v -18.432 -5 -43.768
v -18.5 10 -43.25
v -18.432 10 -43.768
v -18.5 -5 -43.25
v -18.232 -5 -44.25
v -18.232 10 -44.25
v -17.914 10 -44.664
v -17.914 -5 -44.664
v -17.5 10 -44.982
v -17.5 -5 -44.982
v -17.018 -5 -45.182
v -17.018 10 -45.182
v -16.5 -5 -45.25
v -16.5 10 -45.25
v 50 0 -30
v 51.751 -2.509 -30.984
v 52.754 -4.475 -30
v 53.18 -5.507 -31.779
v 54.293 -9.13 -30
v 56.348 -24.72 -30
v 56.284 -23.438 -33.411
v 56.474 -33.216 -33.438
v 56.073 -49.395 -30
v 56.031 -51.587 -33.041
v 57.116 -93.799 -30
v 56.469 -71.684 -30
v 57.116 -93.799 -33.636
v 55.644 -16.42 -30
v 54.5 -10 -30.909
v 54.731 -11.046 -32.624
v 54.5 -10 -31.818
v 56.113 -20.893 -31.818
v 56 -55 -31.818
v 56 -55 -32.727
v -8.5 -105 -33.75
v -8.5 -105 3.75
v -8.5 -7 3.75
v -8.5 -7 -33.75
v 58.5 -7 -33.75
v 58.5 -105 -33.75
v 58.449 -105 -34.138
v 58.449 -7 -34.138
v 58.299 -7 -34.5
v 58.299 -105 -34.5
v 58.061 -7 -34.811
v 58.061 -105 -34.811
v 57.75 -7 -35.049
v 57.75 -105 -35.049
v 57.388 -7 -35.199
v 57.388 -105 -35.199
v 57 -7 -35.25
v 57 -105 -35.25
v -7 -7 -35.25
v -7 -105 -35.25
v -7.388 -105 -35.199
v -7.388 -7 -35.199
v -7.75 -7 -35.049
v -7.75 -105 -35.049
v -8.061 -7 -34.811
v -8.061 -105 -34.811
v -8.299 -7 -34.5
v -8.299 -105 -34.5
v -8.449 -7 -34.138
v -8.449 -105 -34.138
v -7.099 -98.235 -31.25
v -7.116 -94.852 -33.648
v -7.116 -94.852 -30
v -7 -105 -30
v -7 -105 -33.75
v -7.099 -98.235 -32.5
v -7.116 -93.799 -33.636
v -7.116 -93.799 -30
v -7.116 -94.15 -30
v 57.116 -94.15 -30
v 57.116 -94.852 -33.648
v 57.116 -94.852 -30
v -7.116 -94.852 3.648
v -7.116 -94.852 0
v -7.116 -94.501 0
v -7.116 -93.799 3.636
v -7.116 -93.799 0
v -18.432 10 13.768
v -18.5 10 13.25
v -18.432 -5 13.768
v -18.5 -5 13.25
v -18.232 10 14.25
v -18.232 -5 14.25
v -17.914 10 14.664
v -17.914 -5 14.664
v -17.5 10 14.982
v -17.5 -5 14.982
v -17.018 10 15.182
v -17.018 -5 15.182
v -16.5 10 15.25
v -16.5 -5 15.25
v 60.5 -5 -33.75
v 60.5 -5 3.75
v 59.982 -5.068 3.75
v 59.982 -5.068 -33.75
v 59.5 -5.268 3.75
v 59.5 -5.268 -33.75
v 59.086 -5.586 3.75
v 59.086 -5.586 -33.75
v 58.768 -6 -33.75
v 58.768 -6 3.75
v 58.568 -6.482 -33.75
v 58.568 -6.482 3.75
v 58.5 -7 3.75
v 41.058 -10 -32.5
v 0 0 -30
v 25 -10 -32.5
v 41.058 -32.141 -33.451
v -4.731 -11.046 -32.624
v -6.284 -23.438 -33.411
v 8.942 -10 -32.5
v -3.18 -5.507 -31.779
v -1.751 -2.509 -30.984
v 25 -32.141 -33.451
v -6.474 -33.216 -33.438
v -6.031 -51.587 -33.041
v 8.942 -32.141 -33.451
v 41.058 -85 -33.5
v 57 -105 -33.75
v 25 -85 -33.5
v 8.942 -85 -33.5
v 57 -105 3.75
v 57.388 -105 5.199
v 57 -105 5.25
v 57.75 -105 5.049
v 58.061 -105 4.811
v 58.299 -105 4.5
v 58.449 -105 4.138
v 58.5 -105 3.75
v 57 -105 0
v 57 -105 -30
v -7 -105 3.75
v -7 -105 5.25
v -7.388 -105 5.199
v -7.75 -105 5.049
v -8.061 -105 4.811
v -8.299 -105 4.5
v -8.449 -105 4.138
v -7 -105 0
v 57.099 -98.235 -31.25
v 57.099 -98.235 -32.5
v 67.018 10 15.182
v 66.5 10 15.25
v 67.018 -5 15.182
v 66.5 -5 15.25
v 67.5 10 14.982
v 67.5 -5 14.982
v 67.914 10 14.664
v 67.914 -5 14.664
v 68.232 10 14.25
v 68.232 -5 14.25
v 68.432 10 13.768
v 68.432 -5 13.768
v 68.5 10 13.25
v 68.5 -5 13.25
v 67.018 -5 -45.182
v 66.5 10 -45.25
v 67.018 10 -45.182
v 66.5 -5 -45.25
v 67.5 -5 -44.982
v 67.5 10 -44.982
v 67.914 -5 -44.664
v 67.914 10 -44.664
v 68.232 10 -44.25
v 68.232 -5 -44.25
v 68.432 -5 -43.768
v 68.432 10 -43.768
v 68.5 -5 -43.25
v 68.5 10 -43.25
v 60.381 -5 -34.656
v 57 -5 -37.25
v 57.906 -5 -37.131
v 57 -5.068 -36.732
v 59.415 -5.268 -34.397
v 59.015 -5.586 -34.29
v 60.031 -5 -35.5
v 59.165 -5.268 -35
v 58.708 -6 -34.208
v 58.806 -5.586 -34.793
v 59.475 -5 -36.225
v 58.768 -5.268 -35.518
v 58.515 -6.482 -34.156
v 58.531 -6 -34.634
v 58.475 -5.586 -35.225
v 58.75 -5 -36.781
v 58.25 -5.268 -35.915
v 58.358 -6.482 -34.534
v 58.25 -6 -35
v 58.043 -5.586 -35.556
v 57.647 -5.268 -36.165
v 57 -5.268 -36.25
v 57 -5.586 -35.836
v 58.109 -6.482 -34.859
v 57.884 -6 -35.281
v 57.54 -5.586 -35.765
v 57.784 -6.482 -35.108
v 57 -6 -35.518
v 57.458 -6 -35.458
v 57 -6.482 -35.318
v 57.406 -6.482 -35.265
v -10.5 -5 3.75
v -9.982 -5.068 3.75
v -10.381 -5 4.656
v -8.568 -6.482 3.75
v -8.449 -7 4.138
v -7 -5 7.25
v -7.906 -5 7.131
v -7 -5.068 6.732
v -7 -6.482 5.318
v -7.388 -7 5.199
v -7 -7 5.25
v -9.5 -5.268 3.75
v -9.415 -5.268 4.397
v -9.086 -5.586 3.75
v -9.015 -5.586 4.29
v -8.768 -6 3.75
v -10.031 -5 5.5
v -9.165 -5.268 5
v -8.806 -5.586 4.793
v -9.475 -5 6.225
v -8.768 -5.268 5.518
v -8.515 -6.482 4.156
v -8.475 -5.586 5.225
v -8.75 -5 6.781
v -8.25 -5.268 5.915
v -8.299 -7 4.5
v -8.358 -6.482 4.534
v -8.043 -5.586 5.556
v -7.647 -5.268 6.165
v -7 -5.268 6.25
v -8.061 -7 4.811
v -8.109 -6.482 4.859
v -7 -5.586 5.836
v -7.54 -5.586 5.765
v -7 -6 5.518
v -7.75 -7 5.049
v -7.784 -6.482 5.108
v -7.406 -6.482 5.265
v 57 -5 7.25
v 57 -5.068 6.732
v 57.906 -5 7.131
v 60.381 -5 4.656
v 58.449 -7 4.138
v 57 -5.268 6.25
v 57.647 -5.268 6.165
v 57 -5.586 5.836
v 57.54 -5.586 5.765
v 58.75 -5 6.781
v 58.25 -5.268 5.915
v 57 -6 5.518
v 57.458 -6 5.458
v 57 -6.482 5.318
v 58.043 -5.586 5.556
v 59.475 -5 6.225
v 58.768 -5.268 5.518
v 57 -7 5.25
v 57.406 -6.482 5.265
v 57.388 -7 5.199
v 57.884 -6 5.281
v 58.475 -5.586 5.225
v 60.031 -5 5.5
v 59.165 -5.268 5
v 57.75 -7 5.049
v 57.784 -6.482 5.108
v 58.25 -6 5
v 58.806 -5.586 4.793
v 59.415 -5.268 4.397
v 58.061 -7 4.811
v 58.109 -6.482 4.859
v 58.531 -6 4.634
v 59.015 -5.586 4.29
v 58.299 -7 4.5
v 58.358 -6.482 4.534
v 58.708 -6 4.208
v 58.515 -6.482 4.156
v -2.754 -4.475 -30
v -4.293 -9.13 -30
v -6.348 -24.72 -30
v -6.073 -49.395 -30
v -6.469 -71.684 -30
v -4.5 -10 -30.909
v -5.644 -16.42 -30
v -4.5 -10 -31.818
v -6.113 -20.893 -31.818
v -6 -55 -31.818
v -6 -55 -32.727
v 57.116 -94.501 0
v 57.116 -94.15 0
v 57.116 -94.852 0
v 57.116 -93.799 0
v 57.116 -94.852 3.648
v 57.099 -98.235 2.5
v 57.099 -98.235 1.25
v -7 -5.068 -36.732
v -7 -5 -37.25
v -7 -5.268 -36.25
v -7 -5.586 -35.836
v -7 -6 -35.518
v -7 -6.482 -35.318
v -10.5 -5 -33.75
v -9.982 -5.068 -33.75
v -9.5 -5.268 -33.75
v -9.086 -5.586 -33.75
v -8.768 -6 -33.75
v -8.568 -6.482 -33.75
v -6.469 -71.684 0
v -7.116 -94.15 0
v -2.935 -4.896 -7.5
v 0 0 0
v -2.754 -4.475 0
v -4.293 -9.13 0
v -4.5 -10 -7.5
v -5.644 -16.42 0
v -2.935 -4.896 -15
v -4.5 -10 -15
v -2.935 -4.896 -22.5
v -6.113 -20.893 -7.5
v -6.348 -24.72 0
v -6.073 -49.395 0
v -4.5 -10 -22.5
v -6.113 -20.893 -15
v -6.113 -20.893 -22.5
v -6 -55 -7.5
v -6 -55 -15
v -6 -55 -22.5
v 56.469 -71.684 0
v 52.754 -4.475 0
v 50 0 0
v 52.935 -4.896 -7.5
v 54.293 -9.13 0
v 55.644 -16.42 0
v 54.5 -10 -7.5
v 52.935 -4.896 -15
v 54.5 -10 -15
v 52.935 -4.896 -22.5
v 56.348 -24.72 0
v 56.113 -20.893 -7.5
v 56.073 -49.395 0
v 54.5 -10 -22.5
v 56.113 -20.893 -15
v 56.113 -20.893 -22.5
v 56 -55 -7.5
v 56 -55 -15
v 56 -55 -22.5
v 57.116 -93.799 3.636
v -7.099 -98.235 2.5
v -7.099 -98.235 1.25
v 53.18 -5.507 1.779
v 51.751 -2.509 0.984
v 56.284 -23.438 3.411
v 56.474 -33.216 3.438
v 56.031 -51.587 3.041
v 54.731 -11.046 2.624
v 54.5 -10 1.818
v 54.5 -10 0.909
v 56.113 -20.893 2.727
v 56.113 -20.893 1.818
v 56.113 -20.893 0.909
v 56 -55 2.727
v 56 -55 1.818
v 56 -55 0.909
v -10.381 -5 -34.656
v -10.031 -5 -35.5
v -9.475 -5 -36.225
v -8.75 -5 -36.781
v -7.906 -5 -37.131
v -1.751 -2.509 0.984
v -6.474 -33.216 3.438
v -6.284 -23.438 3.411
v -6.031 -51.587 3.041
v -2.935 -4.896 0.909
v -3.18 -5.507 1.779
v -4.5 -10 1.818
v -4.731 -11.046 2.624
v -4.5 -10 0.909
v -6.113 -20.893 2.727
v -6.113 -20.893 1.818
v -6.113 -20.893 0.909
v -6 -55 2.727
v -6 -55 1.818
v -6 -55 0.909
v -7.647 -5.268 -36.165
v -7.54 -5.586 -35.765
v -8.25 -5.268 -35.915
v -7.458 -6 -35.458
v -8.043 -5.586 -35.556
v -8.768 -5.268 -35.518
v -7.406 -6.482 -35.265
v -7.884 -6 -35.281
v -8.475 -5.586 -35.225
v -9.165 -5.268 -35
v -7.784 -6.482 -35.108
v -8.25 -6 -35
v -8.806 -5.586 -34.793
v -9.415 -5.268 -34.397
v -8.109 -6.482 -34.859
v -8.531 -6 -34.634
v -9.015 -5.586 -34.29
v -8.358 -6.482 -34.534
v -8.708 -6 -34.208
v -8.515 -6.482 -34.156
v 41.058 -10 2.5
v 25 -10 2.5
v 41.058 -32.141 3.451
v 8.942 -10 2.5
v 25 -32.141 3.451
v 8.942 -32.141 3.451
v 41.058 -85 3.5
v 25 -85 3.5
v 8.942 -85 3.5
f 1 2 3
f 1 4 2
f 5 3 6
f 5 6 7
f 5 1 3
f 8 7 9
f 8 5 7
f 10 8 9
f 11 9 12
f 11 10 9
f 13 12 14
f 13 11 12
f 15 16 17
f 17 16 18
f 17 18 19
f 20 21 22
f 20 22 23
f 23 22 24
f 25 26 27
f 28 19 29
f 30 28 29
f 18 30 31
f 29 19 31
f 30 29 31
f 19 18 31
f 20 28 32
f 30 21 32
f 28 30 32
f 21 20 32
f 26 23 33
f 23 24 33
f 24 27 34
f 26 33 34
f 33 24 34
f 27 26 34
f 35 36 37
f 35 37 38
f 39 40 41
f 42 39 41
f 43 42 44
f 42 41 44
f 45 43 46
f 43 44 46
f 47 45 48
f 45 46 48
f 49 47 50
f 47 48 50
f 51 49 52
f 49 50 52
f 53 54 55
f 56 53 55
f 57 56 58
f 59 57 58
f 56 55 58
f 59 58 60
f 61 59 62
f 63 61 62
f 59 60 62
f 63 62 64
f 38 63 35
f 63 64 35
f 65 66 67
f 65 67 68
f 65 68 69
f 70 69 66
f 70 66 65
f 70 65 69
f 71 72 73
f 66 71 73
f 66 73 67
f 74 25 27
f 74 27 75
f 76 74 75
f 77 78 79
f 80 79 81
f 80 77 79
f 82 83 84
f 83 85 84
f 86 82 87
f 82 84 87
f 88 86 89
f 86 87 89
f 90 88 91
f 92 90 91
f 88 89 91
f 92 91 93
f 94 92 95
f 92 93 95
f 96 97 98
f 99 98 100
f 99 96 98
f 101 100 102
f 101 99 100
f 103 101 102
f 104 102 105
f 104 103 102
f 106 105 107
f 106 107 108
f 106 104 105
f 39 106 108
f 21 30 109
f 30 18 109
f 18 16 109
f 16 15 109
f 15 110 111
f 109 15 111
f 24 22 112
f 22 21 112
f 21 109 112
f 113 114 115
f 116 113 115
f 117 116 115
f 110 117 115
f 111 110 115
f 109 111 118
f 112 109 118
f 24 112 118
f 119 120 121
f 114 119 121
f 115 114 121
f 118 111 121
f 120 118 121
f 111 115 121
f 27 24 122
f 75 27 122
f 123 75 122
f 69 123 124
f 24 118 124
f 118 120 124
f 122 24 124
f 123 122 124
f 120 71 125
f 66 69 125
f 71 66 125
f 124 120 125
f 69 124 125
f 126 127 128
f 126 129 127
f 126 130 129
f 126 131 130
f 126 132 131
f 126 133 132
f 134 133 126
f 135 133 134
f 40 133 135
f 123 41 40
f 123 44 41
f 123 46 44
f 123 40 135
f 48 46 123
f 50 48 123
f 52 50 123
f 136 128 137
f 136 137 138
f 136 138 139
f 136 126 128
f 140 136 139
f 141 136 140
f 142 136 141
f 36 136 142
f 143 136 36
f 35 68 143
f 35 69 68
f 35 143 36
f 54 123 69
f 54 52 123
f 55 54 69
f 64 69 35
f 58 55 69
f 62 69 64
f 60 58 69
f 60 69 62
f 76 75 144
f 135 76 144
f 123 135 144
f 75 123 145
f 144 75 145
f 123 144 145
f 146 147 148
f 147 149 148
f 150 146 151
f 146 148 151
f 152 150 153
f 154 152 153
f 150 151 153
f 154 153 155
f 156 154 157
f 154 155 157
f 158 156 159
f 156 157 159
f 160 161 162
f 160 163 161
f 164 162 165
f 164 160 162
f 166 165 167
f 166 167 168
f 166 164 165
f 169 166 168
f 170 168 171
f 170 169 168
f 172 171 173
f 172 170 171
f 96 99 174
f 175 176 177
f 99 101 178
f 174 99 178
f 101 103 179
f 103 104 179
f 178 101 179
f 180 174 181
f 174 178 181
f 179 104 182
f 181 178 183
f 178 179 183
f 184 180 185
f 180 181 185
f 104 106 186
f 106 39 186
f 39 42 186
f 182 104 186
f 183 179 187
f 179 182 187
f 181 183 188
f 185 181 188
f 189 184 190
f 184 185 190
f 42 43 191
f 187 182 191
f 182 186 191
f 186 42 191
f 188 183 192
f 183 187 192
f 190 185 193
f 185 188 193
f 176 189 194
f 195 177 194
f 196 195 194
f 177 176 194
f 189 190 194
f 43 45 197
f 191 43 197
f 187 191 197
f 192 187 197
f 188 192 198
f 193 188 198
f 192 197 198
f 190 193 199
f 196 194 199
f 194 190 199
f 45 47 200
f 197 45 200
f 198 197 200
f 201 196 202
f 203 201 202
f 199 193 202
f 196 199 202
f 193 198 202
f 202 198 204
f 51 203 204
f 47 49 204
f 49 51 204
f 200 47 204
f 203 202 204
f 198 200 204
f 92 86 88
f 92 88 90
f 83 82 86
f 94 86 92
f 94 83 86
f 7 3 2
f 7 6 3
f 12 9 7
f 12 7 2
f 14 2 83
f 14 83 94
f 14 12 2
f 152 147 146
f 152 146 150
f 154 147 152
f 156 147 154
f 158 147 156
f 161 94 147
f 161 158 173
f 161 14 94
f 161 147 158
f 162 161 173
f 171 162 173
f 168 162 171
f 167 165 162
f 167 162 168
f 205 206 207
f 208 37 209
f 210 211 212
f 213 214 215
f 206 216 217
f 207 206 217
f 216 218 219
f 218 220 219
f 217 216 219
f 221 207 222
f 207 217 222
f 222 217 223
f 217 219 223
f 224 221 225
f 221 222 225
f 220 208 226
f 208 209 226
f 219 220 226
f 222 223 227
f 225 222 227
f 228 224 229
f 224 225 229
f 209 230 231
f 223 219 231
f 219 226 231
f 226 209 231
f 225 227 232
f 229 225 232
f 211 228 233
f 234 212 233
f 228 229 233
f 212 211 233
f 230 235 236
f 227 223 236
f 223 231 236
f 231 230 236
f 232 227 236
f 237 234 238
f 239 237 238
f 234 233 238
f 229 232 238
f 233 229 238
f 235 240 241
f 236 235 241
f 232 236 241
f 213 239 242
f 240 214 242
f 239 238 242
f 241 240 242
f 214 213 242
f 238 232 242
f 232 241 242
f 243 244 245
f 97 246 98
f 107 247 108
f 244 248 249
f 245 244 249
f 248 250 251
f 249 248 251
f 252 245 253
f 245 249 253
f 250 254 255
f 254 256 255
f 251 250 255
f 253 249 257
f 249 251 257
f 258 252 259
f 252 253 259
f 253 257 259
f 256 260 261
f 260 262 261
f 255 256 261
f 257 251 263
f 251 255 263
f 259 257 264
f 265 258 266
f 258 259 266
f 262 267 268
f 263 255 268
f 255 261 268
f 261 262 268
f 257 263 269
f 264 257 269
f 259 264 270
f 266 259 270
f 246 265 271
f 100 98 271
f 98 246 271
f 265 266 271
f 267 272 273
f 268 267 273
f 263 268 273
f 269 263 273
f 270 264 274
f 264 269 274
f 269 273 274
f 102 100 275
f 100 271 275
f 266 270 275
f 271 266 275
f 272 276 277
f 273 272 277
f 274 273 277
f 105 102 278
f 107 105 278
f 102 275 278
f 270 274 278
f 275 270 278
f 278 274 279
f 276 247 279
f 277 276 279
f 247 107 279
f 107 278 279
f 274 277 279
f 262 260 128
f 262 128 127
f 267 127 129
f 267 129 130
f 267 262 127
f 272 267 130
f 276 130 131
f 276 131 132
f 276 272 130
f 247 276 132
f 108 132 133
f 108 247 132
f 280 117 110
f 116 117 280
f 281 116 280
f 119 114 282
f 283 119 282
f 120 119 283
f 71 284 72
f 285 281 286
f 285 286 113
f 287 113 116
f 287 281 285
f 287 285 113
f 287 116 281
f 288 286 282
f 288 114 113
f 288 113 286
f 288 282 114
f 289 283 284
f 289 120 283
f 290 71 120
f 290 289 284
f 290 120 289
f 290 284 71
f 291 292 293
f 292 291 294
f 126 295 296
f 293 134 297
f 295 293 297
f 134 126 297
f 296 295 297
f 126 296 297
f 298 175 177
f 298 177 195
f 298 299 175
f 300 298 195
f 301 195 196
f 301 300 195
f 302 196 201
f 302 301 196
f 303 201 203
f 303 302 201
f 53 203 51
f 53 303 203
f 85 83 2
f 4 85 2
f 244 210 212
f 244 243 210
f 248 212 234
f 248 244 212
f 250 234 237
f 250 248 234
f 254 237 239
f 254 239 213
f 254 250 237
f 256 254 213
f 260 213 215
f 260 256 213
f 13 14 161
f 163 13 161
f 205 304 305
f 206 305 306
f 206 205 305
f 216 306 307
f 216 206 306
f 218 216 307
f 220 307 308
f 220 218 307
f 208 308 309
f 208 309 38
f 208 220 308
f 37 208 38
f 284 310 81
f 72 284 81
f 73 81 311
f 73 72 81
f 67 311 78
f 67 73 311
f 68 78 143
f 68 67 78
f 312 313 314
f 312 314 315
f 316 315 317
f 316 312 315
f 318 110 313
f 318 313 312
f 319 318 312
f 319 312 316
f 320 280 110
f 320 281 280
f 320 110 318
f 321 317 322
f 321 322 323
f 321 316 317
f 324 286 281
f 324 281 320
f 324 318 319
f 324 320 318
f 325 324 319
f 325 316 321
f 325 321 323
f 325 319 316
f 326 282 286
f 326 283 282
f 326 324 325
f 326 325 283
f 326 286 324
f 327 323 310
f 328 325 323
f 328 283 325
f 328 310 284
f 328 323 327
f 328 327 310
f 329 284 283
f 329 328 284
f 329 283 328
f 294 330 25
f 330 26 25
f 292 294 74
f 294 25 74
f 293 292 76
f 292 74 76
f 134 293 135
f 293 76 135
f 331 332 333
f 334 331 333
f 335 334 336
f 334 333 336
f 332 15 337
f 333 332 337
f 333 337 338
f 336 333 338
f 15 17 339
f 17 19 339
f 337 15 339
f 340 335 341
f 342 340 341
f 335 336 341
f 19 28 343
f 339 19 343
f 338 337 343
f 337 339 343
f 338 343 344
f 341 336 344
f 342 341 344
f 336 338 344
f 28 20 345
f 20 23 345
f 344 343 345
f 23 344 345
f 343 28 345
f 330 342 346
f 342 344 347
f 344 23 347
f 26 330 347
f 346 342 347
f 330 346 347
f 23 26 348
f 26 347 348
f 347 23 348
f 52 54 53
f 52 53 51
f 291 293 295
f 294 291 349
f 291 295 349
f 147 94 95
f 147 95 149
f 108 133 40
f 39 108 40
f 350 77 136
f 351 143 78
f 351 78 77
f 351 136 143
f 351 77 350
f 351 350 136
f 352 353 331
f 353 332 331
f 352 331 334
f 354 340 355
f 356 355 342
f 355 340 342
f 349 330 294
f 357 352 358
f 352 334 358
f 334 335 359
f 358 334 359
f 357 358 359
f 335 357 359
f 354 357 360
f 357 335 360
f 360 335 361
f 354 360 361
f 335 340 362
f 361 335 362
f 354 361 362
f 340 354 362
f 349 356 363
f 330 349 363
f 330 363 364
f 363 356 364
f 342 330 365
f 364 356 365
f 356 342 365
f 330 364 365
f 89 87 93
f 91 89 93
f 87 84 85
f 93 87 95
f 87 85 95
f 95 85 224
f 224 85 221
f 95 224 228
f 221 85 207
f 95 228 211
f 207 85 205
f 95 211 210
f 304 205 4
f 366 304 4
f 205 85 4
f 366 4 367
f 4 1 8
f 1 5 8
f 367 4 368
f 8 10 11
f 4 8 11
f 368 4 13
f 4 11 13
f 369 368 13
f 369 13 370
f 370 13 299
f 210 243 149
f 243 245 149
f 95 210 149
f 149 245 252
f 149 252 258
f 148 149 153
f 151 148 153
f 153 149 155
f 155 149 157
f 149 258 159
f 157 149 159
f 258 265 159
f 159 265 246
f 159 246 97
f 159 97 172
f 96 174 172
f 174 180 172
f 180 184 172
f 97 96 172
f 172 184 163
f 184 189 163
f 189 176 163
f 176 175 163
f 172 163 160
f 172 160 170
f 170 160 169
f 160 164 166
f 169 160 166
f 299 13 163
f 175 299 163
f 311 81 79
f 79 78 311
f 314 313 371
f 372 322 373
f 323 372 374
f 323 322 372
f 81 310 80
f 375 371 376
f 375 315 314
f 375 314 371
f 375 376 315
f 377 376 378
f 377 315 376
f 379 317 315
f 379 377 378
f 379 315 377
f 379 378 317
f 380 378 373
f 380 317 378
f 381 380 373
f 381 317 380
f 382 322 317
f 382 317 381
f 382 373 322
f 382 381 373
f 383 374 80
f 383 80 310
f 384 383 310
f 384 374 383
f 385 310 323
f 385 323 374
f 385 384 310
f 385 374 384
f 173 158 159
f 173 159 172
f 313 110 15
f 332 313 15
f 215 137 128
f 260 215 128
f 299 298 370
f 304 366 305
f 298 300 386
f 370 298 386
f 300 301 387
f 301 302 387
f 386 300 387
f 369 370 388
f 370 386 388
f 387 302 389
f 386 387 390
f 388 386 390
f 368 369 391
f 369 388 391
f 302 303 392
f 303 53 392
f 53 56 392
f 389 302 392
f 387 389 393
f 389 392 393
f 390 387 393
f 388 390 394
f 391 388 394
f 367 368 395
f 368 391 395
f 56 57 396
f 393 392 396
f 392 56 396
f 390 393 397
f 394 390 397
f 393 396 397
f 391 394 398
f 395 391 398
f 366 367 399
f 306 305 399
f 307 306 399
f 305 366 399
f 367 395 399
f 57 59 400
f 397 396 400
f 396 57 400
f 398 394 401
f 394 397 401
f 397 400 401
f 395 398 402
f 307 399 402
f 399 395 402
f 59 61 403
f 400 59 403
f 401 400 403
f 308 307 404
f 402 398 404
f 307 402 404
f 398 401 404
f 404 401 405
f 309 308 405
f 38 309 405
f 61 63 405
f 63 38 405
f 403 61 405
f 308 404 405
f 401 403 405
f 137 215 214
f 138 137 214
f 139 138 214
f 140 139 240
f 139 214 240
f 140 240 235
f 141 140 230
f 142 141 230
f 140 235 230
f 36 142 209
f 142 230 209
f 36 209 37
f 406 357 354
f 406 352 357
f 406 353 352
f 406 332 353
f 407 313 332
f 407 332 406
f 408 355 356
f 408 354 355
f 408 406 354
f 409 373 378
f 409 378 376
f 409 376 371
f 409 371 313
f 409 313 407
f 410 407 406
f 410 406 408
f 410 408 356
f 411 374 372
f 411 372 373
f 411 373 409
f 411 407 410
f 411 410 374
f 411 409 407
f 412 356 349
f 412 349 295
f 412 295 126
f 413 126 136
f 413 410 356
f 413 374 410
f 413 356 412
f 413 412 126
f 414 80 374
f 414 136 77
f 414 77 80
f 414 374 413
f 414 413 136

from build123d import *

# Parameters (mm, degrees)
SKETCH6_W           = 67
SKETCH6_H           = 40.5
BOSS_EXTRUDE1_DEPTH = 105
CUT_LOFT3_START     = -29.9999999
CUT_LOFT3_DEPTH     = 29.9999998
CUT_LOFT3_START_2   = -7.115817743
CUT_LOFT3_2_DEPTH   = 64.231635486
CUT_LOFT3_START_3   = -35
CUT_LOFT3_3_DEPTH   = 40
SKETCH7_W           = 67
SKETCH7_H           = 40.5
BOSS_EXTRUDE2_DEPTH = 10
SKETCH8_W           = 87
SKETCH8_H           = 60.5
SKETCH8_W_2         = 67
SKETCH8_H_2         = 40.5
BOSS_EXTRUDE3_DEPTH = 15
FILLET1_R           = 1.5
FILLET2_R           = 2


with BuildPart() as part:
    # Sketch6 → Boss-Extrude1 (new body)
    with BuildSketch(Plane(origin=(0, -105, 0), x_dir=(-1, 0, 0), z_dir=(0, -1, 0))):
        with Locations((-25, 15)):
            Rectangle(SKETCH6_W, SKETCH6_H)
    extrude(amount=-BOSS_EXTRUDE1_DEPTH)

    # Cut-Loft3: read off the stored shape, not the designer's step
    # Cut-Loft3 outline → Cut-Loft3 (cut)
    with BuildSketch(Plane.XY.offset(CUT_LOFT3_START)):
        with BuildLine():
            Line((50, 0), (0, 0))
            add(Edge.make_bspline(
                [(0, 0), (-2.619218241, -3.17616721), (-8.184453474, -20.412928603), (-4.859899163, -50.249112036), (-7.237735503, -81.623890808), (-7.133275036, -98.330418488), (-7, -105)],
                knots=[0, 0, 0, 0, 0.103246402, 0.528052801, 0.811273442, 1, 1, 1, 1], degree=3))
            Line((-7, -105), (57, -105))
            add(Edge.make_bspline(
                [(50, 0), (52.619218241, -3.17616721), (58.184453474, -20.412928603), (54.859899163, -50.249112036), (57.237735503, -81.623890808), (57.133275036, -98.330418488), (57, -105)],
                knots=[0, 0, 0, 0, 0.103246402, 0.528052801, 0.811273442, 1, 1, 1, 1], degree=3))
        make_face()
    extrude(amount=CUT_LOFT3_DEPTH, mode=Mode.SUBTRACT)

    # Cut-Loft3 2 outline → Cut-Loft3 2 (cut)
    with BuildSketch(Plane.YZ.offset(CUT_LOFT3_START_2)):
        with BuildLine():
            Line((-105, 3.75), (-105, -1e-07))
            Line((-105, -1e-07), (0, 0))
            add(Edge.make_bspline(
                [(0, 0), (-3.17616721, 1.476275787), (-20.412928603, 4.531326169), (-50.249112036, 2.35522903), (-81.623890808, 3.554586021), (-98.330418488, 3.683289611), (-105, 3.75)],
                knots=[0, 0, 0, 0, 0.103246402, 0.528052801, 0.811273442, 1, 1, 1, 1], degree=3))
        make_face()
        with BuildLine():
            add(Edge.make_bspline(
                [(0, -30), (-3.17616721, -31.476275787), (-20.412928603, -34.531326169), (-50.249112036, -32.35522903), (-81.623890808, -33.554586021), (-98.330418488, -33.683289611), (-105, -33.75)],
                knots=[0, 0, 0, 0, 0.103246402, 0.528052801, 0.811273442, 1, 1, 1, 1], degree=3))
            Line((0, -30), (-105, -29.9999999))
            Line((-105, -29.9999999), (-105, -33.75))
        make_face()
    extrude(amount=CUT_LOFT3_2_DEPTH, mode=Mode.SUBTRACT)

    # Cut-Loft3 3 outline → Cut-Loft3 3 (add)
    with BuildSketch(Plane.XY.offset(CUT_LOFT3_START_3)):
        with BuildLine():
            add(Edge.make_bspline(
                [(-7.115817743, -94.852346436), (-7.111621237, -98.234097595), (-7.067571178, -101.618485404), (-7, -105)],
                knots=[0.904314594, 0.904314594, 0.904314594, 0.904314594, 1, 1, 1, 1], degree=3))
            Line((-7.115817743, -94.852346436), (-7.115817743, -105))
            Line((-7.115817743, -105), (-7, -105))
        make_face()
        with BuildLine():
            Line((57.115817743, -105), (57.115817743, -94.852346435))
            add(Edge.make_bspline(
                [(57.115817743, -94.852346435), (57.111621237, -98.234097594), (57.067571178, -101.618485403), (57, -105)],
                knots=[0.904314594, 0.904314594, 0.904314594, 0.904314594, 1, 1, 1, 1], degree=3))
            Line((57, -105), (57.115817743, -105))
        make_face()
        with BuildLine():
            Line((0, 0), (-7.115817743, 0))
            Line((-7.115817743, 0), (-7.115817743, -93.799100649))
            add(Edge.make_bspline(
                [(0, 0), (-2.619218241, -3.17616721), (-8.184453474, -20.412928603), (-4.859899163, -50.249112036), (-6.957672976, -77.928556656), (-7.11212194, -90.862443231), (-7.115817743, -93.799100649)],
                knots=[0, 0, 0, 0, 0.103246402, 0.528052801, 0.811273442, 0.894379998, 0.894379998, 0.894379998, 0.894379998], degree=3))
        make_face()
        with BuildLine():
            Line((57.115817743, 0), (50, 0))
            add(Edge.make_bspline(
                [(50, 0), (52.619218241, -3.17616721), (58.184453474, -20.412928603), (54.859899163, -50.249112036), (56.957672976, -77.928556656), (57.11212194, -90.862443232), (57.115817743, -93.79910065)],
                knots=[0, 0, 0, 0, 0.103246402, 0.528052801, 0.811273442, 0.894379998, 0.894379998, 0.894379998, 0.894379998], degree=3))
            Line((57.115817743, -93.79910065), (57.115817743, 0))
        make_face()
    extrude(amount=CUT_LOFT3_3_DEPTH)

    # Sketch7 → Boss-Extrude2 (add)
    with BuildSketch(Plane(origin=(0, 0, 0), x_dir=(1, 0, 0), z_dir=(0, 1, 0))):
        with Locations((25, 15)):
            Rectangle(SKETCH7_W, SKETCH7_H)
    extrude(amount=BOSS_EXTRUDE2_DEPTH)

    # Sketch8 → Boss-Extrude3 (add)
    with BuildSketch(Plane(origin=(0, 10, 0), x_dir=(1, 0, 0), z_dir=(0, 1, 0))):
        with Locations((25, 15)):
            Rectangle(SKETCH8_W, SKETCH8_H)
        with Locations((25, 15)):
            Rectangle(SKETCH8_W_2, SKETCH8_H_2, mode=Mode.SUBTRACT)
    extrude(amount=-BOSS_EXTRUDE3_DEPTH)

    # Fillet1
    fillet1_edges = [part.edges().sort_by_distance(p)[0] for p in [
        (-8.5, -55, -35.25),
        (58.5, -55, -35.25),
        (58.5, -55, 5.25),
        (-8.5, -55, 5.25),
    ]]
    fillet(fillet1_edges, radius=FILLET1_R)

    # Fillet2
    fillet2_edges = [part.edges().sort_by_distance(p)[0] for p in [
        (68.5, 2.5, -45.25),
        (68.5, 2.5, 15.25),
        (-18.5, 2.5, 15.25),
        (-18.5, 2.5, -45.25),
        (25, -5, 5.25),
        (-8.5, -5, -15),
        (58.5, -5, -15),
        (25, -5, -35.25),
        (-8.060660172, -5, 4.810660172),
        (58.060660172, -5, 4.810660172),
        (58.060660172, -5, -34.810660172),
        (-8.060660172, -5, -34.810660172),
    ]]
    fillet(fillet2_edges, radius=FILLET2_R)


solid = part.part
